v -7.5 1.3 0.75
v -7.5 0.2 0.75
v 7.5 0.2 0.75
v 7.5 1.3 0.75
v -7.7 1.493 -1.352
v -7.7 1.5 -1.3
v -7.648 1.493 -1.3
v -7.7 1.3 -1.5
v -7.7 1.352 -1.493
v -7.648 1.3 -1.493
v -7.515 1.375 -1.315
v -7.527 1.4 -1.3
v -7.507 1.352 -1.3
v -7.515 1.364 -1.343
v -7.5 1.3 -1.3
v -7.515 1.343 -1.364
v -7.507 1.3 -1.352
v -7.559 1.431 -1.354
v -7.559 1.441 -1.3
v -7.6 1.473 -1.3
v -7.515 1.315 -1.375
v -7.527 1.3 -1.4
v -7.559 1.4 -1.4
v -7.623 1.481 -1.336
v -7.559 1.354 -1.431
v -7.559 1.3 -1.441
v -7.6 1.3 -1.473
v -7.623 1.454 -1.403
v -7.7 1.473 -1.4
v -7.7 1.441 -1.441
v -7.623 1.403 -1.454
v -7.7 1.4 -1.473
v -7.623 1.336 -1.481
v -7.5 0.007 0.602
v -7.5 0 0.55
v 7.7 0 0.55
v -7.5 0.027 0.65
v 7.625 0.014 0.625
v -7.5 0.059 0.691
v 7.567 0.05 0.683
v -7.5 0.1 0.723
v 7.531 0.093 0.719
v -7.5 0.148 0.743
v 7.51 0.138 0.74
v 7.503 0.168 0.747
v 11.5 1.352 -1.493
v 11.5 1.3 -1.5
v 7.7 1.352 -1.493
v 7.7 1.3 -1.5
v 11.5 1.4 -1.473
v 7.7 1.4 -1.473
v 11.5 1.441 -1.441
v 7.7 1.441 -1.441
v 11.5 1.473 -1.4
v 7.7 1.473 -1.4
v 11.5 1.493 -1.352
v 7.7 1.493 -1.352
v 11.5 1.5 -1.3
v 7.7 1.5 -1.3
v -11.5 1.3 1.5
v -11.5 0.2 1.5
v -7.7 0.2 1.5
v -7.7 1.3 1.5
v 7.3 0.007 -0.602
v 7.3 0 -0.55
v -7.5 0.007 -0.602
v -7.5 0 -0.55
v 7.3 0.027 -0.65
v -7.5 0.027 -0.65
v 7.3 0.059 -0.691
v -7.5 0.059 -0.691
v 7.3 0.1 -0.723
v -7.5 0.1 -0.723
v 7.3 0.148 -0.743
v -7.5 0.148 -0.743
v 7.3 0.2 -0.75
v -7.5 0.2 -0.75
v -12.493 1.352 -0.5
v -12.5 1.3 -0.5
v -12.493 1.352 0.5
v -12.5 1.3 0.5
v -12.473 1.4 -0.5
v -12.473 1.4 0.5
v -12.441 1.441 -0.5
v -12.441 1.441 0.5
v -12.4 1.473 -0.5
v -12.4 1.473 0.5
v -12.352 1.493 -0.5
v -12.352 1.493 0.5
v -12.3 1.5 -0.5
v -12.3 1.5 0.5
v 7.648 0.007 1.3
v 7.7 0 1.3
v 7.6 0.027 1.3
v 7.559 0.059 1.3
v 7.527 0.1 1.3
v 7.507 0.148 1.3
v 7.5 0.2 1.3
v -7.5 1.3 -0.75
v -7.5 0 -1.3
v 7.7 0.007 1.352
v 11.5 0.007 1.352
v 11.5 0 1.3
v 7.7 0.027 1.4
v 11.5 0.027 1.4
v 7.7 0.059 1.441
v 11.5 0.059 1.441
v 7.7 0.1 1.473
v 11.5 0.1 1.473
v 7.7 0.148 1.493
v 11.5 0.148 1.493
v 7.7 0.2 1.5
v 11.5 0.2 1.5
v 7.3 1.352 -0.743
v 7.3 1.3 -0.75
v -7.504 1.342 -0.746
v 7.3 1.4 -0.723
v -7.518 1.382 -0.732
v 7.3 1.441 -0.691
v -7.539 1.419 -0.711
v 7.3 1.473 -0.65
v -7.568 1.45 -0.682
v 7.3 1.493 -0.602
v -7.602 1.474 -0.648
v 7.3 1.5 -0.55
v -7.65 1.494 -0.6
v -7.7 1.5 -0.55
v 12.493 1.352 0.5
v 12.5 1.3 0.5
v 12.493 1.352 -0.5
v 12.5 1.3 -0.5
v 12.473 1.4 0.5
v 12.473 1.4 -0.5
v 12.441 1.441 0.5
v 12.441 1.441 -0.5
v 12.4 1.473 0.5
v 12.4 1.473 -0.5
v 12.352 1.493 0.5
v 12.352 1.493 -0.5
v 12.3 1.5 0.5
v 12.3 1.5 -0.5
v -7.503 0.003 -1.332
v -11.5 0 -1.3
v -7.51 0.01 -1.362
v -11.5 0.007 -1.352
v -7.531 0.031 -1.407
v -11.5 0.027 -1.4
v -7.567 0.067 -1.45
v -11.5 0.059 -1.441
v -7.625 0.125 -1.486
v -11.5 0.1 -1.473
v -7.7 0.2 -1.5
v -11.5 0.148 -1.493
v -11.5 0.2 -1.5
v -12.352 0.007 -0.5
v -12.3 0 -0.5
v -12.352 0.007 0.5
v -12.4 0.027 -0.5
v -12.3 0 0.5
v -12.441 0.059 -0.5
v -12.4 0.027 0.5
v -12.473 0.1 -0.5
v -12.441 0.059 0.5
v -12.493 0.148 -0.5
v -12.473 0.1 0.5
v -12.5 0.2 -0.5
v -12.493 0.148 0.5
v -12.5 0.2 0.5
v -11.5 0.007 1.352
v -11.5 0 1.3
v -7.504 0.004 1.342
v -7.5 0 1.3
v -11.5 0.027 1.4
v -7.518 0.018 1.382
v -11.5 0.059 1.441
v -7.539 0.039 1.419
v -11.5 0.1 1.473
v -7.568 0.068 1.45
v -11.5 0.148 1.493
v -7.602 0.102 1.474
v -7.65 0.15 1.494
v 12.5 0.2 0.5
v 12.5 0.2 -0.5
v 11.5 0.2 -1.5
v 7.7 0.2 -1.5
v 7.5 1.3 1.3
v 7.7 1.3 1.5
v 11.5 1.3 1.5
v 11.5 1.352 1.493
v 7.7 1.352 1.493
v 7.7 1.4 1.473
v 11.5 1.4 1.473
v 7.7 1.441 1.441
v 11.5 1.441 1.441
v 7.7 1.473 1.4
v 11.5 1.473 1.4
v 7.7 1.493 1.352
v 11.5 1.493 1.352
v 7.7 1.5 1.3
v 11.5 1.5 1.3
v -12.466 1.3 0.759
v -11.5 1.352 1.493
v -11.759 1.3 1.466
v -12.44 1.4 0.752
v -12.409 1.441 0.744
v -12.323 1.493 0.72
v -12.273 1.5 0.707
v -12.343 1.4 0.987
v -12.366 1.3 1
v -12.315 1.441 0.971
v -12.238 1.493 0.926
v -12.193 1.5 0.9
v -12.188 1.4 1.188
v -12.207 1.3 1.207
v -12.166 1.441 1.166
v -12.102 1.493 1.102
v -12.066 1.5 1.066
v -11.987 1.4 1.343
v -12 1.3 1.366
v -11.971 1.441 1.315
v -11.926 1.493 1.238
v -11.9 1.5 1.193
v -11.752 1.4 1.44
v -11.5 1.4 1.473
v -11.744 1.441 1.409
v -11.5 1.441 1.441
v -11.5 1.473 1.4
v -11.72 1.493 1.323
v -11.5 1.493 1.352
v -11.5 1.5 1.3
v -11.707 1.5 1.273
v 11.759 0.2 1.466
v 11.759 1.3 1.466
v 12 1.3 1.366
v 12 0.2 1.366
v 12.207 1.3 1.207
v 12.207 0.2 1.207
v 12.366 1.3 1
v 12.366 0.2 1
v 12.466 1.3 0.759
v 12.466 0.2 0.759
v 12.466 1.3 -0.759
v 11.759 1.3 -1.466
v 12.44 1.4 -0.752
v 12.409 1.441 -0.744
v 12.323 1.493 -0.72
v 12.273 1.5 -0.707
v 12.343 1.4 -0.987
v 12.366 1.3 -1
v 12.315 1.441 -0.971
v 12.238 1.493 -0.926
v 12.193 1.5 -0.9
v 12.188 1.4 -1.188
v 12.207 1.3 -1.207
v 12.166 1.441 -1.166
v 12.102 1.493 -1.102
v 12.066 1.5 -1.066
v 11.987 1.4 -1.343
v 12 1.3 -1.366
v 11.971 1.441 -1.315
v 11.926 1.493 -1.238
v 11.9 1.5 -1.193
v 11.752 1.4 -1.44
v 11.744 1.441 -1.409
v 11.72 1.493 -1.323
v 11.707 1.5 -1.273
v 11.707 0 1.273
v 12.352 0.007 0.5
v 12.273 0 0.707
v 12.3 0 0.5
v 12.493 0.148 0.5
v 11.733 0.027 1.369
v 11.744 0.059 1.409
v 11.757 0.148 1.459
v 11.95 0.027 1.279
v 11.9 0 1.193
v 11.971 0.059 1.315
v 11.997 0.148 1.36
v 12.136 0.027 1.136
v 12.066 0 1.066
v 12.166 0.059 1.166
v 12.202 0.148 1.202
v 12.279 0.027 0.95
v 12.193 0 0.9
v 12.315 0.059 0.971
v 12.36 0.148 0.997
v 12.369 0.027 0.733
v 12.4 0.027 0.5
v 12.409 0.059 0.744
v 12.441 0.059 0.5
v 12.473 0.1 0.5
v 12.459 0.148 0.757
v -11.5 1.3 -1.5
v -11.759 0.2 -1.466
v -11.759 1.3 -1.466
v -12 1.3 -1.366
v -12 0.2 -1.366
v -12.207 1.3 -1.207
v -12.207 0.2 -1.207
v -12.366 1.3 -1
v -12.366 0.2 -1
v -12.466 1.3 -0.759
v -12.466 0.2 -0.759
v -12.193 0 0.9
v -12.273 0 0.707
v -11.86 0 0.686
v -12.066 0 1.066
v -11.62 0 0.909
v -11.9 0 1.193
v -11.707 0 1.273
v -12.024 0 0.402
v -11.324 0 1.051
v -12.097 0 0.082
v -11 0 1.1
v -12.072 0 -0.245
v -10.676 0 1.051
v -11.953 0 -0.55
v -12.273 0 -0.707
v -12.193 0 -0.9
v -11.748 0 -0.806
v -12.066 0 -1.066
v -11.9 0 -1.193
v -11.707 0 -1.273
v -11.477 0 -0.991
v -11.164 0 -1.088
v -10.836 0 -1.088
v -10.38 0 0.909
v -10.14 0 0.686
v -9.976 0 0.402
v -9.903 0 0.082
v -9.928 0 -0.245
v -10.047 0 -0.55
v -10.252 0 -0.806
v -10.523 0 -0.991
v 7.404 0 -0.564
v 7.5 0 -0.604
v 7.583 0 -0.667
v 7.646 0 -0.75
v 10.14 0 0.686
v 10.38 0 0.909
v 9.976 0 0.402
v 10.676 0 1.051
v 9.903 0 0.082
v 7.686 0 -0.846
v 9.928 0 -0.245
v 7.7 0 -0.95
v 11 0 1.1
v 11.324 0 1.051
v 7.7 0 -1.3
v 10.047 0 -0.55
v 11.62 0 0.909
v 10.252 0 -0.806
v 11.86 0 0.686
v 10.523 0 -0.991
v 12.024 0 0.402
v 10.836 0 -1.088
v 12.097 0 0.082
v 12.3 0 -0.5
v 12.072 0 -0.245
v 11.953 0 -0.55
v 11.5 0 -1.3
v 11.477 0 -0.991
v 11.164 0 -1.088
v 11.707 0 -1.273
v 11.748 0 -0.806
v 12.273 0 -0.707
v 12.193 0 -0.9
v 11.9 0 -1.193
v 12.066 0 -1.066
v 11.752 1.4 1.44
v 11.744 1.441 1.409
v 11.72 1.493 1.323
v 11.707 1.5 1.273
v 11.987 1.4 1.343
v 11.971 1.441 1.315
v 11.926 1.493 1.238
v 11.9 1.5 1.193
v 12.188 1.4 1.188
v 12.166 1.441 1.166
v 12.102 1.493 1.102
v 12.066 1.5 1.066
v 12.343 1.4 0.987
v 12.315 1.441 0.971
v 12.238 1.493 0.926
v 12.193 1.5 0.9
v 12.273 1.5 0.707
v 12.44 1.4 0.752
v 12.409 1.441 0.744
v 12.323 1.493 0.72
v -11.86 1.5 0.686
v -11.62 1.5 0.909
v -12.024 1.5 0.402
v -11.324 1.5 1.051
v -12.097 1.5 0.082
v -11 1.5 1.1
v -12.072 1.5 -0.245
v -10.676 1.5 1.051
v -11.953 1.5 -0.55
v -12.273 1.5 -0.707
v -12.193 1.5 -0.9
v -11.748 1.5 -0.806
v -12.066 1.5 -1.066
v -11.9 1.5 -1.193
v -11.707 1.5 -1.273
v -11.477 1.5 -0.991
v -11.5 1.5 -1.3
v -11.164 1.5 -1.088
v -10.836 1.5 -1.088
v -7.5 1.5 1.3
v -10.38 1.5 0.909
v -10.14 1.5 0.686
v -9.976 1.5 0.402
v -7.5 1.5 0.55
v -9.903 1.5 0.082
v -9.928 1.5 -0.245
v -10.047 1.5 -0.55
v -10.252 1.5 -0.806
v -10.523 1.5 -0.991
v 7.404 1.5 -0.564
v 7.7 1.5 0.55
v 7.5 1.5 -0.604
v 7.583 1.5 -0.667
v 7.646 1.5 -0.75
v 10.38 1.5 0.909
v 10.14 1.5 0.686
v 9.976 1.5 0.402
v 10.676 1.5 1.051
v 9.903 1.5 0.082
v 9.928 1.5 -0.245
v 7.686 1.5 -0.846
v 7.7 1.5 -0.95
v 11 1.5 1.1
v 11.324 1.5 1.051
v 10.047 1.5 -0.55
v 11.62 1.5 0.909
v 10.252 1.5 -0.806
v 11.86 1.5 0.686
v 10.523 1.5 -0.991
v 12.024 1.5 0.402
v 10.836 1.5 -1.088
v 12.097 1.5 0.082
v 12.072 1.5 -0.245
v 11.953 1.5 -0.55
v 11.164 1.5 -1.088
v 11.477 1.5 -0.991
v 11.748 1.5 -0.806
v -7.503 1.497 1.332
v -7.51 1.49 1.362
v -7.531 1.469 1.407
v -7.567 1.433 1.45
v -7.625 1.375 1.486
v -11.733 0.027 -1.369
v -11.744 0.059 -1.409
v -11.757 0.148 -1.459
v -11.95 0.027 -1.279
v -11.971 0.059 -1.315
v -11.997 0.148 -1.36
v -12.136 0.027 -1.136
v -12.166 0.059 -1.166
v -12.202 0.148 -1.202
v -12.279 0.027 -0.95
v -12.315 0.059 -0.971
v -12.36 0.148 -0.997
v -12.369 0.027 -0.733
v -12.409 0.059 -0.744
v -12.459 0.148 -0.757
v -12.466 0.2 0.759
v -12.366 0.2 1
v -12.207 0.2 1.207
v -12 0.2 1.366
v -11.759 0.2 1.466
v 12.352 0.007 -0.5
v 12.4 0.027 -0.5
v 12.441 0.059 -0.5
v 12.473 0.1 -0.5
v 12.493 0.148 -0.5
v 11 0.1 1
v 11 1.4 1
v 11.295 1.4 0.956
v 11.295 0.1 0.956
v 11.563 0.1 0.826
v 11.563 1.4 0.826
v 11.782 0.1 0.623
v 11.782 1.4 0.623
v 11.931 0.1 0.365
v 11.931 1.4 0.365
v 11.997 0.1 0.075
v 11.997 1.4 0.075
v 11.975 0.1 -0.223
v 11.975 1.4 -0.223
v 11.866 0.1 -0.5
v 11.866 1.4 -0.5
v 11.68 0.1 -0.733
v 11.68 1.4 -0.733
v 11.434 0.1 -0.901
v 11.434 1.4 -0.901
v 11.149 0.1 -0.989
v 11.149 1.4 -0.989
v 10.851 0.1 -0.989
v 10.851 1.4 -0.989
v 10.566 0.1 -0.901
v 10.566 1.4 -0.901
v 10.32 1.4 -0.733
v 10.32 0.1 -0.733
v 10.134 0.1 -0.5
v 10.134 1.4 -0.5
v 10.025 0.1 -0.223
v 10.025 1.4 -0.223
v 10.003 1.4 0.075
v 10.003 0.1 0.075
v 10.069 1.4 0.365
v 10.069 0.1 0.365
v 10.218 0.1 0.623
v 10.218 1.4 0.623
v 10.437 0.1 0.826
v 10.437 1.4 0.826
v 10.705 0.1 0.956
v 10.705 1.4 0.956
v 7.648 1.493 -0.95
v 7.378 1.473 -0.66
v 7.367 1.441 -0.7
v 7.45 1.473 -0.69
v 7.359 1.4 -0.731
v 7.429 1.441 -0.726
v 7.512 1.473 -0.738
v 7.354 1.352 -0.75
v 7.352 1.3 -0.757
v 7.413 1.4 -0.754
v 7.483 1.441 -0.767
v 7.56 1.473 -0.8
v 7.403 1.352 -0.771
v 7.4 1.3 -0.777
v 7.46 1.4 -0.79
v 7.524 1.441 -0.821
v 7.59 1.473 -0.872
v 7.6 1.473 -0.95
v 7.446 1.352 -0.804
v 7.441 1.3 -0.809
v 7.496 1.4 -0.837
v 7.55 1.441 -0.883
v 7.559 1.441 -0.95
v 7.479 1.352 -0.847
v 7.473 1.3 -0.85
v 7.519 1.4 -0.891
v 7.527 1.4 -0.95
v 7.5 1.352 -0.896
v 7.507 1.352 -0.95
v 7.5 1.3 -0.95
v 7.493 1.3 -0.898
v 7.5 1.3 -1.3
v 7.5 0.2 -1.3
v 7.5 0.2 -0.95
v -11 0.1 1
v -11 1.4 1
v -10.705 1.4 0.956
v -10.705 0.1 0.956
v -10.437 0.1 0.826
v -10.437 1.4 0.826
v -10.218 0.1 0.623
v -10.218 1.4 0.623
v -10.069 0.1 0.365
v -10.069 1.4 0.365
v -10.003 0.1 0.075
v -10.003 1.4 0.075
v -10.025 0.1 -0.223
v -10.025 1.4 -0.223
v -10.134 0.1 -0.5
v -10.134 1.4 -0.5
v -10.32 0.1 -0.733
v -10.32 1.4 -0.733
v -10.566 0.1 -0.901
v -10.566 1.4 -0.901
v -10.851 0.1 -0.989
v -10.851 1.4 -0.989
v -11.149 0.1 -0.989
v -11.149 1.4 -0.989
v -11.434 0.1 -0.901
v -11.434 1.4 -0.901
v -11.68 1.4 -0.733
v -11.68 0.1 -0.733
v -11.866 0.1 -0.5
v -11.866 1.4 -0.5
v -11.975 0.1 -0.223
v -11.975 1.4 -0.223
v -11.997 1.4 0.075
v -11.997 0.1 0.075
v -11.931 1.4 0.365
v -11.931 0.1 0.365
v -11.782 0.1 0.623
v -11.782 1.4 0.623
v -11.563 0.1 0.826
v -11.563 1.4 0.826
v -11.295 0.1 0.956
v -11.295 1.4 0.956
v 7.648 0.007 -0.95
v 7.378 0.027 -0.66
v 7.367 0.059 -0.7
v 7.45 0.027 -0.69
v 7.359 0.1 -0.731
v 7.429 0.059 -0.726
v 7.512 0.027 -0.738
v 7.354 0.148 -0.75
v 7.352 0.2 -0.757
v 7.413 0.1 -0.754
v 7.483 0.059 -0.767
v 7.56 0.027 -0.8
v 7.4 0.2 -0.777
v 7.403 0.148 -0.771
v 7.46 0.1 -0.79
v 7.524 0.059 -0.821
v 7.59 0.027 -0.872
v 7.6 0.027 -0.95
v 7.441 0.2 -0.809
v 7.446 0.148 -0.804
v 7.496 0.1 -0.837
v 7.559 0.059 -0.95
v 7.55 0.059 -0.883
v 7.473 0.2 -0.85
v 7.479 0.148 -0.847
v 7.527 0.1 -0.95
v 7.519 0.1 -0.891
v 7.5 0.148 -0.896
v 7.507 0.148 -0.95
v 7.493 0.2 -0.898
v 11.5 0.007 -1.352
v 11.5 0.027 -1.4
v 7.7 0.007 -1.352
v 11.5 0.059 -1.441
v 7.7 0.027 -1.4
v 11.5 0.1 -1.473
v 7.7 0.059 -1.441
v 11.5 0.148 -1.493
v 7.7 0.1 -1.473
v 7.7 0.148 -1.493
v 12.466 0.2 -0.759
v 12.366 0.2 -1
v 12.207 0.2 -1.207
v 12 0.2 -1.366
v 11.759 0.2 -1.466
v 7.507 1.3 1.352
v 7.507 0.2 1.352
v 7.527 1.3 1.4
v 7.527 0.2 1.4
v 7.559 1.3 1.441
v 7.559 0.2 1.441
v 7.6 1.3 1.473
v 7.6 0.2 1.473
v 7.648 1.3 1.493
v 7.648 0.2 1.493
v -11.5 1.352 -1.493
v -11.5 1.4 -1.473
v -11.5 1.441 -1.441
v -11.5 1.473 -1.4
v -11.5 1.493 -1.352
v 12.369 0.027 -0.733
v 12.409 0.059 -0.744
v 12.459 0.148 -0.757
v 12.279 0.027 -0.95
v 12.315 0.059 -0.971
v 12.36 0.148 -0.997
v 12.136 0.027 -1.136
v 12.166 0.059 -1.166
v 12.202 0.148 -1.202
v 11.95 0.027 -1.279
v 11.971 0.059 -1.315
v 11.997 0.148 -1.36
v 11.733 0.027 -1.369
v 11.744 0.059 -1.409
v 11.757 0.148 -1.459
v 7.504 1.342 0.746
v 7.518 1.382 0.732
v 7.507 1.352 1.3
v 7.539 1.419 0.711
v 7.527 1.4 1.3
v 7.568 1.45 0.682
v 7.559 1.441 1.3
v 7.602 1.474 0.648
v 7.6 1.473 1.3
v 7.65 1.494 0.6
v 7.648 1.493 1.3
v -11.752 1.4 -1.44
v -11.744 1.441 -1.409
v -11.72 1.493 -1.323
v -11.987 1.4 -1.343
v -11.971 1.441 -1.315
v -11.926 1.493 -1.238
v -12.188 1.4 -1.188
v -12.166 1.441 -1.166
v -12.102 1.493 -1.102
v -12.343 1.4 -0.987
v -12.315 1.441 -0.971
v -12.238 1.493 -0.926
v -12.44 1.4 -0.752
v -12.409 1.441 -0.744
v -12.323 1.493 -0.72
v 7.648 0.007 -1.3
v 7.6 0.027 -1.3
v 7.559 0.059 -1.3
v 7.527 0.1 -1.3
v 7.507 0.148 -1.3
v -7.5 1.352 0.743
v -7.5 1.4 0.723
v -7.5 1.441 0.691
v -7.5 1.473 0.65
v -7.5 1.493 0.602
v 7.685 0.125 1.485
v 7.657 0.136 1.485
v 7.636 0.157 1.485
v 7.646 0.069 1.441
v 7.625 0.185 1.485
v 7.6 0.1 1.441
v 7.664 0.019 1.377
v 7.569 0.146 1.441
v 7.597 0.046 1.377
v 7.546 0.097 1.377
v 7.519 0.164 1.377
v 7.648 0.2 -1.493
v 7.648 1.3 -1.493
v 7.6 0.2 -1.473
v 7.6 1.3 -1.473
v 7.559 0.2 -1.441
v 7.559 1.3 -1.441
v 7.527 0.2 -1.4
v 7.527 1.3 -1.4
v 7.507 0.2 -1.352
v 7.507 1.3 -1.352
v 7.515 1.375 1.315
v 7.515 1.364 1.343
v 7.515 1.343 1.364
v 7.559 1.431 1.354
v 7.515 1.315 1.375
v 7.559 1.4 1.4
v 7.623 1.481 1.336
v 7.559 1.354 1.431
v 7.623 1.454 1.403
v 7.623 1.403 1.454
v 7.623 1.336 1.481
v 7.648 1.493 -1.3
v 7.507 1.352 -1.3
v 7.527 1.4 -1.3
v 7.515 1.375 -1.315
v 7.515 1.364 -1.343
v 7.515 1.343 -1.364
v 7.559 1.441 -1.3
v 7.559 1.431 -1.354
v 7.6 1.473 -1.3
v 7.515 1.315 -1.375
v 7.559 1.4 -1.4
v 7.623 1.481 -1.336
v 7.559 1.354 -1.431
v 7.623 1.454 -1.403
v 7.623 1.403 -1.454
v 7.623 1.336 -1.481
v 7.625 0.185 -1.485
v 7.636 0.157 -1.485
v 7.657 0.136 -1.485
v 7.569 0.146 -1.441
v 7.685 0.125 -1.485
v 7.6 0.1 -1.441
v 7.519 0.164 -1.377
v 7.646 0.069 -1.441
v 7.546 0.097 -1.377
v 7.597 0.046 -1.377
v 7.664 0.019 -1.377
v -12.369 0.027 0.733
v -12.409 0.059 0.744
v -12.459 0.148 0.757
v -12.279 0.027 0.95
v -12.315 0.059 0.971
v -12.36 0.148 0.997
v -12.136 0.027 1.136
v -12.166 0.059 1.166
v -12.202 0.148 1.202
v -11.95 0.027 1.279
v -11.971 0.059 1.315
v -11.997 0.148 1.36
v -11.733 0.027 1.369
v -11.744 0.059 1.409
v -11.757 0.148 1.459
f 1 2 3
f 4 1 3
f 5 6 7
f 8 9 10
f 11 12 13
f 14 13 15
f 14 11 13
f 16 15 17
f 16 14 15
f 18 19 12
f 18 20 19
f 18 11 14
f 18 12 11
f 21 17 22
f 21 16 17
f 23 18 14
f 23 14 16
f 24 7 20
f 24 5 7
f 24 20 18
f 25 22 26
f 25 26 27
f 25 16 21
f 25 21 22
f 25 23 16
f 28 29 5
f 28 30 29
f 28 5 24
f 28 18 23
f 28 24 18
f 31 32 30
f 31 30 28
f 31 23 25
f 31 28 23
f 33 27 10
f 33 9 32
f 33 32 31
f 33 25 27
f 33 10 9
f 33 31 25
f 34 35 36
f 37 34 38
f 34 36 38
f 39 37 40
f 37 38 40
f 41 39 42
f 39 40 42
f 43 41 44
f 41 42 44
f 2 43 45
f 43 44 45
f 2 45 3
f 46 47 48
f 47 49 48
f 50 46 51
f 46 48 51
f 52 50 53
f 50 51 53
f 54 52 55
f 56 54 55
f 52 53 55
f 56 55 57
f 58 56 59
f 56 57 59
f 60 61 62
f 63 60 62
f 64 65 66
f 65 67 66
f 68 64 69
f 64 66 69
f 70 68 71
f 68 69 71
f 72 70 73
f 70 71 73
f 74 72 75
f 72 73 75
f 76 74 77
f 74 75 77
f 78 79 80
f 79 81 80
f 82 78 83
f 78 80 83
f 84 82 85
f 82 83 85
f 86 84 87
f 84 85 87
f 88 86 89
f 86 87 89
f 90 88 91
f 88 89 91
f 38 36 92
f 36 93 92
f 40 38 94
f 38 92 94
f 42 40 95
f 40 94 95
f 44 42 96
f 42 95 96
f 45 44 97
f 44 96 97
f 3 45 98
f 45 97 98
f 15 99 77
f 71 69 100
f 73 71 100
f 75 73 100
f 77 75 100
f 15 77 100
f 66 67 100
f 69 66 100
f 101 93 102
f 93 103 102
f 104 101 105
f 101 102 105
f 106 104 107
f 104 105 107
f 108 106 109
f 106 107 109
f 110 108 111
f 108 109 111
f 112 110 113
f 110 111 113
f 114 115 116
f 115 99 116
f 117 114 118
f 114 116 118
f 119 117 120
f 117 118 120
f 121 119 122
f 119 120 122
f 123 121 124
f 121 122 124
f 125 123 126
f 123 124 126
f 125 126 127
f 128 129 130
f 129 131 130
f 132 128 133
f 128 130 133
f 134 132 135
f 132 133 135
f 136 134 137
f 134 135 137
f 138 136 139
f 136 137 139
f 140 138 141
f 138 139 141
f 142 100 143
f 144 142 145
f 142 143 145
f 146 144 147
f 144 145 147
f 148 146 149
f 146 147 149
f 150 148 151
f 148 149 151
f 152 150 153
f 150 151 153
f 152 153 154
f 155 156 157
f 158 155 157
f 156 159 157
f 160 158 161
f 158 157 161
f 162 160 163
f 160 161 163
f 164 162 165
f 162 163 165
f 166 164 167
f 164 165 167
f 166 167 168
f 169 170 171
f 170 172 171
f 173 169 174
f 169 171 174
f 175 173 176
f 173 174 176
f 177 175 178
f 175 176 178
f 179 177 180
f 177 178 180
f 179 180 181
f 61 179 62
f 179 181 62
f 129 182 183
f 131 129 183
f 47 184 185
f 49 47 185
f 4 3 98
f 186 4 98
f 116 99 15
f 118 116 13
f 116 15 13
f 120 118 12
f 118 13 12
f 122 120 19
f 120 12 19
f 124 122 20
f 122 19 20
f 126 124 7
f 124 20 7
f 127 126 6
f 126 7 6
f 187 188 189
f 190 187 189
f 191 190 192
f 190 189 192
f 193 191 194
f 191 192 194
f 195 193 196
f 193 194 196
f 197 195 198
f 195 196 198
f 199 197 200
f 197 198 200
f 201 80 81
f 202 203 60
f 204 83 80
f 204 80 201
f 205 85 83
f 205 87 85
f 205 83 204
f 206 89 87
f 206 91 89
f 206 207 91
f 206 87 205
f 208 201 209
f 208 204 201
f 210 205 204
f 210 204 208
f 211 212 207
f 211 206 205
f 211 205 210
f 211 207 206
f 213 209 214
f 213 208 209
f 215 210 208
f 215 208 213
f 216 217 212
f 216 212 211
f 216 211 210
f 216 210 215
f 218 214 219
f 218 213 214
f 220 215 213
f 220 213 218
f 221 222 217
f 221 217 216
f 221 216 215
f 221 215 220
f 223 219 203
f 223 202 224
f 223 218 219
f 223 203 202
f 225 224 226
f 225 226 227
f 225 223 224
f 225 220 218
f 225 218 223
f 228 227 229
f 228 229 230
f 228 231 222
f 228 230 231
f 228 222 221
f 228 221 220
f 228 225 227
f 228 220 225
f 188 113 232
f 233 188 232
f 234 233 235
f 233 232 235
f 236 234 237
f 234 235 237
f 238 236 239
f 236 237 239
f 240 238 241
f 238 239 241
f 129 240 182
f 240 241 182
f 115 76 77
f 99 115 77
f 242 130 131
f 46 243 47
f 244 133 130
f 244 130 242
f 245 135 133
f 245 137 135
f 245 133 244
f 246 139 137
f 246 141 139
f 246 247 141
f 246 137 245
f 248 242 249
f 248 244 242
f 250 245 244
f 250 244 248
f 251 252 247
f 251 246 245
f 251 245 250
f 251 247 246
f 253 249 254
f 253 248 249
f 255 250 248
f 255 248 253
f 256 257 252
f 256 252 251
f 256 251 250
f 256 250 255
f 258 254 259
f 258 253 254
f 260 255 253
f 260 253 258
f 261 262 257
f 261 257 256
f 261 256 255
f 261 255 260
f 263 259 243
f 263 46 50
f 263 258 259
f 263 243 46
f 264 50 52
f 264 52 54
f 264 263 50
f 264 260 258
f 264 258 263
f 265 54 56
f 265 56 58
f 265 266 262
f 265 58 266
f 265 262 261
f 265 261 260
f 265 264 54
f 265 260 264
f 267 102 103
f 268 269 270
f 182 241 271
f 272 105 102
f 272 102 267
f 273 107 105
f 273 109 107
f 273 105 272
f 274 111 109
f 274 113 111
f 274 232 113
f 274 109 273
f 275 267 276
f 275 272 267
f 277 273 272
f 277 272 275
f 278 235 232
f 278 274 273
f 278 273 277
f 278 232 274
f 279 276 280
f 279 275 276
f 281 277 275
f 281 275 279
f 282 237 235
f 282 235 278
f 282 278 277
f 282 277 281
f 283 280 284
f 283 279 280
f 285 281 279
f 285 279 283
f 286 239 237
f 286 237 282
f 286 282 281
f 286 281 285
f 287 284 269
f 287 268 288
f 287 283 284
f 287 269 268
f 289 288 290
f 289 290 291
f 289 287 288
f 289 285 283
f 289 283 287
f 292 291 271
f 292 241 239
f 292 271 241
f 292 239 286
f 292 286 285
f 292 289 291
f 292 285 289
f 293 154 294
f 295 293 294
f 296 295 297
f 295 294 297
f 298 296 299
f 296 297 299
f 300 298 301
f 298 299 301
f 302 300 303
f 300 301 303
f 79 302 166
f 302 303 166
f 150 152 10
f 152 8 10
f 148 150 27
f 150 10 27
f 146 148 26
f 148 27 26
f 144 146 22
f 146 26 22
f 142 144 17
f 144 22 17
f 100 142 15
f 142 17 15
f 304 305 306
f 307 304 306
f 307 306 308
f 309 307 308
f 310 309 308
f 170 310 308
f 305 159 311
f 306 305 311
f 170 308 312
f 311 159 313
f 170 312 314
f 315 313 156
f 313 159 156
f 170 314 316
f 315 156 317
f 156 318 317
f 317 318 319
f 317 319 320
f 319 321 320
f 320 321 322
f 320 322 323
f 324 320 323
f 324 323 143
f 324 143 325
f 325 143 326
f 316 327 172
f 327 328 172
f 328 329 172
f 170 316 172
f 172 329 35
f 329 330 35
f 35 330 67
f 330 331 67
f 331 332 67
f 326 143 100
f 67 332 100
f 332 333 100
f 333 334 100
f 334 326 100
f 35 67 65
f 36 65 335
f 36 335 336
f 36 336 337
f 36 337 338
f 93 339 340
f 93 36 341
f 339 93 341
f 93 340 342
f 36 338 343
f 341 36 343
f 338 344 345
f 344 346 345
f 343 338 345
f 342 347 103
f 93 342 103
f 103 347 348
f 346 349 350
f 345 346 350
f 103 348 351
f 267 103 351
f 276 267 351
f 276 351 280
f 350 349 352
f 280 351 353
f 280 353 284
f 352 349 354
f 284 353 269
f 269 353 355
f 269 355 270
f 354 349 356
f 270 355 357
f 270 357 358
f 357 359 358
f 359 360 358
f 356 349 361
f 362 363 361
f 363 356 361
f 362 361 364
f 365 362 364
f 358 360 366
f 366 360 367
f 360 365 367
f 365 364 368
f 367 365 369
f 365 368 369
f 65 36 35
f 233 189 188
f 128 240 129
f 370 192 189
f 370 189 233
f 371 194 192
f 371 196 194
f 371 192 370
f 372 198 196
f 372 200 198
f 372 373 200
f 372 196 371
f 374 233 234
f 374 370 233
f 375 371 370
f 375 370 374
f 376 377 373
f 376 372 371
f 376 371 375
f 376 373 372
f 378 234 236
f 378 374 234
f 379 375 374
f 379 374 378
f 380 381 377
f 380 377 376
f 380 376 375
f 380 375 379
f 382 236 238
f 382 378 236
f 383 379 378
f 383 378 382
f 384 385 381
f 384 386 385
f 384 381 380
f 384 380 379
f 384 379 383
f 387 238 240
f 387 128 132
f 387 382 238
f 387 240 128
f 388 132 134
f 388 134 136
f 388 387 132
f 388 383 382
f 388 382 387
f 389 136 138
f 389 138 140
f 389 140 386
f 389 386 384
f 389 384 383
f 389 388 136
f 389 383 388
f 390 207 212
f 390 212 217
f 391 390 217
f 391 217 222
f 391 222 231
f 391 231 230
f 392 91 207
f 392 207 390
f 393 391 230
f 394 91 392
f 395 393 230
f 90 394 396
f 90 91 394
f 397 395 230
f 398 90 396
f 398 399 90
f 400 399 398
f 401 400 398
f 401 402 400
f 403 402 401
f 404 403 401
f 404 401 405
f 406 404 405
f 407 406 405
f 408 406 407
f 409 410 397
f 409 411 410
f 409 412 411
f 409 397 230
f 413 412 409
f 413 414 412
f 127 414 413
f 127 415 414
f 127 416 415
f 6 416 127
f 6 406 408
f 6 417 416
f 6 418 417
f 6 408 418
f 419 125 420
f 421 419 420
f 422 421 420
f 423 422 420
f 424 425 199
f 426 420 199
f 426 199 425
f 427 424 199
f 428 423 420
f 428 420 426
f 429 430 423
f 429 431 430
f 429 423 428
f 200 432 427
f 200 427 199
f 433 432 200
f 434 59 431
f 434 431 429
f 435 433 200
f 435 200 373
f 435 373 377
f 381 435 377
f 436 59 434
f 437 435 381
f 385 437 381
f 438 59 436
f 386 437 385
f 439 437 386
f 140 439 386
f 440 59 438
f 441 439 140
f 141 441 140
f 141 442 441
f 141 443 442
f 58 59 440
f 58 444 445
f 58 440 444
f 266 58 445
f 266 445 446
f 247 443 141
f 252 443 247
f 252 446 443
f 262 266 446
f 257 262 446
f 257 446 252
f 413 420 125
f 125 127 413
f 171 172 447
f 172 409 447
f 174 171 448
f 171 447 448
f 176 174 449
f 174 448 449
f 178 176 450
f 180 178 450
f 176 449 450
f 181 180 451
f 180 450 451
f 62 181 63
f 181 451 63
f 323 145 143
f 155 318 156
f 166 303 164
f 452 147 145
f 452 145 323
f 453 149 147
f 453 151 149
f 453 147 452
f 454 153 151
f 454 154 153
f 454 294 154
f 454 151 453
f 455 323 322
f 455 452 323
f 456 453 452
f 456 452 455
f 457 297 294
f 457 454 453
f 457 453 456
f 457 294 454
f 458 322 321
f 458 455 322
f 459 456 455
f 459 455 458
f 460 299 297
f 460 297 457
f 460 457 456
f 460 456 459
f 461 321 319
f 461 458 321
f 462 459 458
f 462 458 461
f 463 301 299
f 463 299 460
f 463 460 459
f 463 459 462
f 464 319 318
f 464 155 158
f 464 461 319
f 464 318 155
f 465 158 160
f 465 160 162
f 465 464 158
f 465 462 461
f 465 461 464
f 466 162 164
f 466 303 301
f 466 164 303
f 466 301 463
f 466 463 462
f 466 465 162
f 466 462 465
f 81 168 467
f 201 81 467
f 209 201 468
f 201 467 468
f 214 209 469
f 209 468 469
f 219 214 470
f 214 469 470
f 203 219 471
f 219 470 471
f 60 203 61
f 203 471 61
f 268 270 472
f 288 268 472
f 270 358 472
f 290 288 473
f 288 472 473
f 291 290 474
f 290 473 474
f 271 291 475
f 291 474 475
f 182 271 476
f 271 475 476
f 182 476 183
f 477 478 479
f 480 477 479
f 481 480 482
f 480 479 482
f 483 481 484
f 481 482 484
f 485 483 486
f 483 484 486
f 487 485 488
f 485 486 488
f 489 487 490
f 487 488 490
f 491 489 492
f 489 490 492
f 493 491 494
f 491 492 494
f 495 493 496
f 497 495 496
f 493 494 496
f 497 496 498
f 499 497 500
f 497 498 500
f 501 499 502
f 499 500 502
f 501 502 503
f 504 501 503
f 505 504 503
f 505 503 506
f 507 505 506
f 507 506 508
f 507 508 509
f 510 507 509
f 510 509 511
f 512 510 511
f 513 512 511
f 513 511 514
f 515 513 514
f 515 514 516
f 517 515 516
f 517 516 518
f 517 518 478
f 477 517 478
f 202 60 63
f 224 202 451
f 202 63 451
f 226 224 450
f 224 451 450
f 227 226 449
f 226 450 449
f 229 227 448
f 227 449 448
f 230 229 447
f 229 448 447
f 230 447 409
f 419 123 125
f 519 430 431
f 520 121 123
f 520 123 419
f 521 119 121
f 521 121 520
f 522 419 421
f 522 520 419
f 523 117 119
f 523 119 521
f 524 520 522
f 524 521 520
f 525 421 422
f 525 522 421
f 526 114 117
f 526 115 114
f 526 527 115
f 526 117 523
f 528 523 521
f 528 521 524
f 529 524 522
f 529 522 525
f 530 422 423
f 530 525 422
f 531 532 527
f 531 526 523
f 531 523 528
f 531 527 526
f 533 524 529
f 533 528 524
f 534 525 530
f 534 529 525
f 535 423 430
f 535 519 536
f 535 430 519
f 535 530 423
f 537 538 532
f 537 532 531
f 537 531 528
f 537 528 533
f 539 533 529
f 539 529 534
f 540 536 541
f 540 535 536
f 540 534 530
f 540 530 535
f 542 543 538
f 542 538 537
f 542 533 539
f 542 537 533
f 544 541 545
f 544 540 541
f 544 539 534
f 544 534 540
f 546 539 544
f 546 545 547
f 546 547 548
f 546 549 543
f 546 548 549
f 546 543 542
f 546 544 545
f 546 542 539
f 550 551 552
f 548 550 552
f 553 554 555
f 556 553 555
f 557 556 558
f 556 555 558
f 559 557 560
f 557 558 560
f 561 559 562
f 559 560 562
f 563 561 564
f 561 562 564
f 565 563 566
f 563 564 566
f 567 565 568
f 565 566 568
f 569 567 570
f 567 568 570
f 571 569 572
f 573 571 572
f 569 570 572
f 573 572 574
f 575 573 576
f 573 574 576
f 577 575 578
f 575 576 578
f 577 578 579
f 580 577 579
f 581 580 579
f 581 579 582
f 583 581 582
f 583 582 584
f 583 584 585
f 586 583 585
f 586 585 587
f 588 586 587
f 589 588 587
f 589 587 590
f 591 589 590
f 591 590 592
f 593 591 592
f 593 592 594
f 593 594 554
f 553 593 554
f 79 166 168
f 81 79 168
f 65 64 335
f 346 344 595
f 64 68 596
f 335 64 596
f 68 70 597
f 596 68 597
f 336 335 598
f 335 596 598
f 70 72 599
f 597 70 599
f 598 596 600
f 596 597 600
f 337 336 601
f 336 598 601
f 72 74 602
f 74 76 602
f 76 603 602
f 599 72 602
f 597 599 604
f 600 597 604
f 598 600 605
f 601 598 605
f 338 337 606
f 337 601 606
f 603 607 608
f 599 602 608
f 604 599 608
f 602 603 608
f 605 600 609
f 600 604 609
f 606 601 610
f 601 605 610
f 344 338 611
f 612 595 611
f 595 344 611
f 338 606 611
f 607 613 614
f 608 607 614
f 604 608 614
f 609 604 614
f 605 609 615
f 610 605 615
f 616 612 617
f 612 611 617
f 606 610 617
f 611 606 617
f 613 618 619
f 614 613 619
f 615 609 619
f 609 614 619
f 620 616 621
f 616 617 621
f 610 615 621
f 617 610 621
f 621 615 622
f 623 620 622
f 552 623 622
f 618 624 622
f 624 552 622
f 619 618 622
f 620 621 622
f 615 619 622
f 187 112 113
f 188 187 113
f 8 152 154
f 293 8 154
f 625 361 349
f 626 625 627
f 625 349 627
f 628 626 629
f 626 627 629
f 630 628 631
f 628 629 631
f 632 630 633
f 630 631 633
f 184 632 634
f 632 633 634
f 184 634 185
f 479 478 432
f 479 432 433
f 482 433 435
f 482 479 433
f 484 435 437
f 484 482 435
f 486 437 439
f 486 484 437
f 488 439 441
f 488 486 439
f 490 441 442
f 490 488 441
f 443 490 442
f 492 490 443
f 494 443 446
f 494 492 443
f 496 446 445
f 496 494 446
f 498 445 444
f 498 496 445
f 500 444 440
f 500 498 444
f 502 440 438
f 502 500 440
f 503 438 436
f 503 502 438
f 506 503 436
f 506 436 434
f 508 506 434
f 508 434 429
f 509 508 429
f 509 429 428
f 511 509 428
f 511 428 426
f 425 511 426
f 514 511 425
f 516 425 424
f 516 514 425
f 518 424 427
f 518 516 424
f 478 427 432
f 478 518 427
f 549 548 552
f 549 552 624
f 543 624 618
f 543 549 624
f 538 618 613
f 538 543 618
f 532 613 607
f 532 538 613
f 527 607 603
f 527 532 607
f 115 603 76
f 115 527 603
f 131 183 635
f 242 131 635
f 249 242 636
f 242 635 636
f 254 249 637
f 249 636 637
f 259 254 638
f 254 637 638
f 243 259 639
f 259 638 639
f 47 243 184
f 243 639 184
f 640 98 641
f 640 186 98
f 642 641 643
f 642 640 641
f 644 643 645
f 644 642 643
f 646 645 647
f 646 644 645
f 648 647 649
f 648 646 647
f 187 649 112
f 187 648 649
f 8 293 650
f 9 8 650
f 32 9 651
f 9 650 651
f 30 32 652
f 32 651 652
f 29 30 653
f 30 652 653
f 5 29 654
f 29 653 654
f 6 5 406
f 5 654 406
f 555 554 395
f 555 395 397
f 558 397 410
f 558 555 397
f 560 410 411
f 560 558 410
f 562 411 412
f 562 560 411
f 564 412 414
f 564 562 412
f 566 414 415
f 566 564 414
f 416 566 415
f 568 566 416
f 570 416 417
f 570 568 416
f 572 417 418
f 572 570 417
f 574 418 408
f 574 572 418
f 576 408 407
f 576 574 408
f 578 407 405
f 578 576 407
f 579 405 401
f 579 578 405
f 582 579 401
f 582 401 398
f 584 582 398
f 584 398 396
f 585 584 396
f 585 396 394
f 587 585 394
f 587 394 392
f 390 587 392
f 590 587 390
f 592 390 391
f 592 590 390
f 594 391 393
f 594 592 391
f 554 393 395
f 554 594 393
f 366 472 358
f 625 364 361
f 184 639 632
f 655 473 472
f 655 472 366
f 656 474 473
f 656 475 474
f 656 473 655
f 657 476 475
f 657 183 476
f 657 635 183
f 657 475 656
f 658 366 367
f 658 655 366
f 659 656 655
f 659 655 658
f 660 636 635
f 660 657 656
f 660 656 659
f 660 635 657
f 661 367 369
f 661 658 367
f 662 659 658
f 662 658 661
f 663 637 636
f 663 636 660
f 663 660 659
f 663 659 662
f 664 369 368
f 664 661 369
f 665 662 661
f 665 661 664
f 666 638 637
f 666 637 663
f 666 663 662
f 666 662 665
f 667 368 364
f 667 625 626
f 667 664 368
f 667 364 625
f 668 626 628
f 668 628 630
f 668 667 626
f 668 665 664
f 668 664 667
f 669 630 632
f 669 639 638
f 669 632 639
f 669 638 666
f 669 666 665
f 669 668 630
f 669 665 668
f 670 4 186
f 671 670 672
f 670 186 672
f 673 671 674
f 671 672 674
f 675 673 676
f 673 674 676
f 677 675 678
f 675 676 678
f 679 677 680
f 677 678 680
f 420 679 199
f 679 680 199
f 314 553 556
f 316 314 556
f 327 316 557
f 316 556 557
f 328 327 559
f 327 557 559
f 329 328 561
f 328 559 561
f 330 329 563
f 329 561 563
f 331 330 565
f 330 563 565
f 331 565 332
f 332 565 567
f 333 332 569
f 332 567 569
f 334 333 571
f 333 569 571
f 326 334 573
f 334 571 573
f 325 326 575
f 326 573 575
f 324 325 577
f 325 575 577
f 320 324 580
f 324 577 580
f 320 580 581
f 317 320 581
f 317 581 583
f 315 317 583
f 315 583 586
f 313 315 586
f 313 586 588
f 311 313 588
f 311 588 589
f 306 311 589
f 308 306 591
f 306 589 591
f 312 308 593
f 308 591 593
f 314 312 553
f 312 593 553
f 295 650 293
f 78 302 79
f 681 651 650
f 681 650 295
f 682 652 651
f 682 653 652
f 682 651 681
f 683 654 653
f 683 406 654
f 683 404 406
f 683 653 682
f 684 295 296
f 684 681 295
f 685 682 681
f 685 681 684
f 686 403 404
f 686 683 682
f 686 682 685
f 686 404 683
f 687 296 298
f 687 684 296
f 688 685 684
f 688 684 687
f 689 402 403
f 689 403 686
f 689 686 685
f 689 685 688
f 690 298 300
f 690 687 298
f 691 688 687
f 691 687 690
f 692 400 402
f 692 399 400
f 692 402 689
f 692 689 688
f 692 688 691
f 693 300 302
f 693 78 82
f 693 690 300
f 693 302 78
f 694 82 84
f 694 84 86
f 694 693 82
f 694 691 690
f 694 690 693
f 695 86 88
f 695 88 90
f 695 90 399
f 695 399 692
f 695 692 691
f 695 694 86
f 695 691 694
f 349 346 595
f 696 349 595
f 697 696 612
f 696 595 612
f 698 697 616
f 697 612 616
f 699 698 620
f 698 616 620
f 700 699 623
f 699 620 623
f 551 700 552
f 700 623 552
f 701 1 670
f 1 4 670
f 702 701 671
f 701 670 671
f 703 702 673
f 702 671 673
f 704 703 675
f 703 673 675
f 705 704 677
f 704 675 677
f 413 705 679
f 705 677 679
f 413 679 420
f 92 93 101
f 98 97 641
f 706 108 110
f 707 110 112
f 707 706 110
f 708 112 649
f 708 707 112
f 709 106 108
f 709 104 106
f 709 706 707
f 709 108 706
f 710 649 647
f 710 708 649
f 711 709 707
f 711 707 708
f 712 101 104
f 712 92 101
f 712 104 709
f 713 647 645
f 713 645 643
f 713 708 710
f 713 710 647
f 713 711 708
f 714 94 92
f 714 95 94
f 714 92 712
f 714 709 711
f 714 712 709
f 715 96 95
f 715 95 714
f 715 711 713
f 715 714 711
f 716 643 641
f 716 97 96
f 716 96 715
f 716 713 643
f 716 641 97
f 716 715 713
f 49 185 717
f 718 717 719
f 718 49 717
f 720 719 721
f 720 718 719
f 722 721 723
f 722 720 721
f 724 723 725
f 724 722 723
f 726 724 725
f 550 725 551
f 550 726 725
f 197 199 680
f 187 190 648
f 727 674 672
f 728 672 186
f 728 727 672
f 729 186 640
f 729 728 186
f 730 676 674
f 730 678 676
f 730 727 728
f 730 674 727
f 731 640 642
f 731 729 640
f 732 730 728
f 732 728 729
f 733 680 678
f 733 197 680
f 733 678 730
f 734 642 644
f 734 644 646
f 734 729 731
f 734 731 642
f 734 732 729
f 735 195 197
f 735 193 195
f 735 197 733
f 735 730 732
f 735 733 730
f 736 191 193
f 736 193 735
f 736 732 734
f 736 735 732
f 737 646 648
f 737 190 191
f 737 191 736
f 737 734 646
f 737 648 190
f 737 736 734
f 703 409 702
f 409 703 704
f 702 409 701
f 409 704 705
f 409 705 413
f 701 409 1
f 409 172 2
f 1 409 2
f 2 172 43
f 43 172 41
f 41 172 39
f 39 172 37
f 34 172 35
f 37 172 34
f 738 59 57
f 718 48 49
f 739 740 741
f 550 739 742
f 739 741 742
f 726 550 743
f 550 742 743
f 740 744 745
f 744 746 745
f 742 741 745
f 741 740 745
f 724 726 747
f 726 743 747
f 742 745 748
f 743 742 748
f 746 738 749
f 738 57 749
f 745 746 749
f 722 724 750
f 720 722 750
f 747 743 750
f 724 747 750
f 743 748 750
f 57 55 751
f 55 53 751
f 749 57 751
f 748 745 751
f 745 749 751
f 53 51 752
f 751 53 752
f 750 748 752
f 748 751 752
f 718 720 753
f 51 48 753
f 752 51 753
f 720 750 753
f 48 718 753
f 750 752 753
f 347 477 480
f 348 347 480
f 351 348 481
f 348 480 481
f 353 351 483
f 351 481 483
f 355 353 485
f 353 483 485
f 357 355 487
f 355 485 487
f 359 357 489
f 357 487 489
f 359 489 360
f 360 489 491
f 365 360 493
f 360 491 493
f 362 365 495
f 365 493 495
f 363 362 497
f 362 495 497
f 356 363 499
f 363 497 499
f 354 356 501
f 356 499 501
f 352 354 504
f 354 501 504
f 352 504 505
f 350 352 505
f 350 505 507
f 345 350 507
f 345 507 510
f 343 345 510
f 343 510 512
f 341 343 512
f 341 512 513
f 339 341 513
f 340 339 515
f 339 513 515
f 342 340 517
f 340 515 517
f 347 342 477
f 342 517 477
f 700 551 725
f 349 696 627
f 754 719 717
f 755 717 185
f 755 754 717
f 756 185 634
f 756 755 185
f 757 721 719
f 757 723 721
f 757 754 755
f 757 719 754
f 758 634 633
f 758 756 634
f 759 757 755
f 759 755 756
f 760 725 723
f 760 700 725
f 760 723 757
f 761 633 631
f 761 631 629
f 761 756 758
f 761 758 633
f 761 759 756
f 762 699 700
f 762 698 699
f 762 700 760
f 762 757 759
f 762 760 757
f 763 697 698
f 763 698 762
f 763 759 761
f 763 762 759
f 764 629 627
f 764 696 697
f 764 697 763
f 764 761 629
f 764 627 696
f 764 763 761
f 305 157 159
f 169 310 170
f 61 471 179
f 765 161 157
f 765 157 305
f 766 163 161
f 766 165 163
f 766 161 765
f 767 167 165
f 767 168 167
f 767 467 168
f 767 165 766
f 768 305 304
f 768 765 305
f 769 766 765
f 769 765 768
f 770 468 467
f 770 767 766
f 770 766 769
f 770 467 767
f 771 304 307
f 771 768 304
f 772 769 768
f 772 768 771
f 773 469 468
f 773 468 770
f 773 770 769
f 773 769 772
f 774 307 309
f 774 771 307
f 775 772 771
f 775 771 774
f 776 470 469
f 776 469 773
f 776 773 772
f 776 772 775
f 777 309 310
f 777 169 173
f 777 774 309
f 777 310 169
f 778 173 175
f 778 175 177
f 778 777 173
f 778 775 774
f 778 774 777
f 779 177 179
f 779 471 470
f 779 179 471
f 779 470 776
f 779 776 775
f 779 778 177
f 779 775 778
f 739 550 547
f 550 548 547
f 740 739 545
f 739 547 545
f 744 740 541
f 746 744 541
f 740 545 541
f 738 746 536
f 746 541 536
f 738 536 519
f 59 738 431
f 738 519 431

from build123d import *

# Parameters (mm, degrees)
BOSS_EXTRUDE1_DEPTH = 1.5
SKETCH2_R           = 1
CUT_EXTRUDE1_DEPTH  = 13.678722333
CHAMFER1_SIZE       = 0.1
FILLET1_R           = 0.2


with BuildPart() as part:
    # Sketch1 → Boss-Extrude1 (new body)
    with BuildSketch(Plane(origin=(0, 0, 0), x_dir=(1, 0, 0), z_dir=(0, 1, 0))):
        with BuildLine():
            Line((7.5, -0.75), (7.5, -1.5))
            Line((7.5, -1.5), (11.5, -1.5))
            ThreePointArc((11.5, -1.5), (12.207106781, -1.207106781), (12.5, -0.5))
            Line((12.5, -0.5), (12.5, 0.5))
            ThreePointArc((12.5, 0.5), (12.207106781, 1.207106781), (11.5, 1.5))
            Line((11.5, 1.5), (7.5, 1.5))
            Line((7.5, 1.5), (7.5, 0.75))
            Line((7.5, 0.75), (-7.5, 0.75))
            Line((-7.5, 0.75), (-7.5, 1.5))
            Line((-7.5, 1.5), (-11.5, 1.5))
            ThreePointArc((-11.5, 1.5), (-12.207106781, 1.207106781), (-12.5, 0.5))
            Line((-12.5, 0.5), (-12.5, -0.5))
            ThreePointArc((-12.5, -0.5), (-12.207106781, -1.207106781), (-11.5, -1.5))
            Line((-11.5, -1.5), (-7.5, -1.5))
            Line((-7.5, -1.5), (-7.5, -0.75))
            Line((-7.5, -0.75), (7.5, -0.75))
        make_face()
    extrude(amount=BOSS_EXTRUDE1_DEPTH)

    # Sketch2 → Cut-Extrude1 (cut, through all)
    with BuildSketch(Plane(origin=(0, 1.5, 0), x_dir=(1, 0, 0), z_dir=(0, 1, 0))):
        with Locations(Location((-11, 0, 0), (0, 0, 270))):
            Circle(SKETCH2_R)
        with Locations(Location((11, 0, 0), (0, 0, 270))):
            Circle(SKETCH2_R)
    extrude(amount=-CUT_EXTRUDE1_DEPTH, mode=Mode.SUBTRACT)

    # Chamfer1
    chamfer1_edges = [part.edges().sort_by_distance(p)[0] for p in [
        (-11, 0, -1),
        (-11, 1.5, -1),
        (11, 0, -1),
        (11, 1.5, -1),
    ]]
    chamfer(chamfer1_edges, length=CHAMFER1_SIZE)

    # Fillet1
    fillet1_edges = [part.edges().sort_by_distance(p)[0] for p in [
        (7.5, 0, 1.125),
        (7.5, 0, -1.125),
        (0, 0, 0.75),
        (12.5, 1.5, 0),
        (7.5, 1.5, 1.125),
        (0, 1.5, 0.75),
        (-12.5, 1.5, 0),
        (-7.5, 1.5, -1.125),
        (7.5, 1.5, -1.125),
        (-7.5, 0.75, -1.5),
        (-9.5, 1.5, -1.5),
        (-9.5, 0, -1.5),
        (7.5, 0.75, -0.75),
        (0, 1.5, -0.75),
        (0, 0, -0.75),
        (9.5, 1.5, -1.5),
        (7.5, 0.75, -1.5),
        (9.5, 0, -1.5),
        (-9.5, 1.5, 1.5),
        (-7.5, 0.75, 1.5),
        (-9.5, 0, 1.5),
        (7.5, 0.75, 1.5),
        (9.5, 1.5, 1.5),
        (9.5, 0, 1.5),
        (12.207106781, 0, -1.207106781),
        (12.5, 0, 0),
        (12.207106781, 0, 1.207106781),
        (12.207106781, 1.5, -1.207106781),
        (12.207106781, 1.5, 1.207106781),
        (-12.207106781, 0, 1.207106781),
        (-12.5, 0, 0),
        (-12.207106781, 0, -1.207106781),
        (-12.207106781, 1.5, 1.207106781),
        (-12.207106781, 1.5, -1.207106781),
    ]]
    fillet(fillet1_edges, radius=FILLET1_R)


solid = part.part
